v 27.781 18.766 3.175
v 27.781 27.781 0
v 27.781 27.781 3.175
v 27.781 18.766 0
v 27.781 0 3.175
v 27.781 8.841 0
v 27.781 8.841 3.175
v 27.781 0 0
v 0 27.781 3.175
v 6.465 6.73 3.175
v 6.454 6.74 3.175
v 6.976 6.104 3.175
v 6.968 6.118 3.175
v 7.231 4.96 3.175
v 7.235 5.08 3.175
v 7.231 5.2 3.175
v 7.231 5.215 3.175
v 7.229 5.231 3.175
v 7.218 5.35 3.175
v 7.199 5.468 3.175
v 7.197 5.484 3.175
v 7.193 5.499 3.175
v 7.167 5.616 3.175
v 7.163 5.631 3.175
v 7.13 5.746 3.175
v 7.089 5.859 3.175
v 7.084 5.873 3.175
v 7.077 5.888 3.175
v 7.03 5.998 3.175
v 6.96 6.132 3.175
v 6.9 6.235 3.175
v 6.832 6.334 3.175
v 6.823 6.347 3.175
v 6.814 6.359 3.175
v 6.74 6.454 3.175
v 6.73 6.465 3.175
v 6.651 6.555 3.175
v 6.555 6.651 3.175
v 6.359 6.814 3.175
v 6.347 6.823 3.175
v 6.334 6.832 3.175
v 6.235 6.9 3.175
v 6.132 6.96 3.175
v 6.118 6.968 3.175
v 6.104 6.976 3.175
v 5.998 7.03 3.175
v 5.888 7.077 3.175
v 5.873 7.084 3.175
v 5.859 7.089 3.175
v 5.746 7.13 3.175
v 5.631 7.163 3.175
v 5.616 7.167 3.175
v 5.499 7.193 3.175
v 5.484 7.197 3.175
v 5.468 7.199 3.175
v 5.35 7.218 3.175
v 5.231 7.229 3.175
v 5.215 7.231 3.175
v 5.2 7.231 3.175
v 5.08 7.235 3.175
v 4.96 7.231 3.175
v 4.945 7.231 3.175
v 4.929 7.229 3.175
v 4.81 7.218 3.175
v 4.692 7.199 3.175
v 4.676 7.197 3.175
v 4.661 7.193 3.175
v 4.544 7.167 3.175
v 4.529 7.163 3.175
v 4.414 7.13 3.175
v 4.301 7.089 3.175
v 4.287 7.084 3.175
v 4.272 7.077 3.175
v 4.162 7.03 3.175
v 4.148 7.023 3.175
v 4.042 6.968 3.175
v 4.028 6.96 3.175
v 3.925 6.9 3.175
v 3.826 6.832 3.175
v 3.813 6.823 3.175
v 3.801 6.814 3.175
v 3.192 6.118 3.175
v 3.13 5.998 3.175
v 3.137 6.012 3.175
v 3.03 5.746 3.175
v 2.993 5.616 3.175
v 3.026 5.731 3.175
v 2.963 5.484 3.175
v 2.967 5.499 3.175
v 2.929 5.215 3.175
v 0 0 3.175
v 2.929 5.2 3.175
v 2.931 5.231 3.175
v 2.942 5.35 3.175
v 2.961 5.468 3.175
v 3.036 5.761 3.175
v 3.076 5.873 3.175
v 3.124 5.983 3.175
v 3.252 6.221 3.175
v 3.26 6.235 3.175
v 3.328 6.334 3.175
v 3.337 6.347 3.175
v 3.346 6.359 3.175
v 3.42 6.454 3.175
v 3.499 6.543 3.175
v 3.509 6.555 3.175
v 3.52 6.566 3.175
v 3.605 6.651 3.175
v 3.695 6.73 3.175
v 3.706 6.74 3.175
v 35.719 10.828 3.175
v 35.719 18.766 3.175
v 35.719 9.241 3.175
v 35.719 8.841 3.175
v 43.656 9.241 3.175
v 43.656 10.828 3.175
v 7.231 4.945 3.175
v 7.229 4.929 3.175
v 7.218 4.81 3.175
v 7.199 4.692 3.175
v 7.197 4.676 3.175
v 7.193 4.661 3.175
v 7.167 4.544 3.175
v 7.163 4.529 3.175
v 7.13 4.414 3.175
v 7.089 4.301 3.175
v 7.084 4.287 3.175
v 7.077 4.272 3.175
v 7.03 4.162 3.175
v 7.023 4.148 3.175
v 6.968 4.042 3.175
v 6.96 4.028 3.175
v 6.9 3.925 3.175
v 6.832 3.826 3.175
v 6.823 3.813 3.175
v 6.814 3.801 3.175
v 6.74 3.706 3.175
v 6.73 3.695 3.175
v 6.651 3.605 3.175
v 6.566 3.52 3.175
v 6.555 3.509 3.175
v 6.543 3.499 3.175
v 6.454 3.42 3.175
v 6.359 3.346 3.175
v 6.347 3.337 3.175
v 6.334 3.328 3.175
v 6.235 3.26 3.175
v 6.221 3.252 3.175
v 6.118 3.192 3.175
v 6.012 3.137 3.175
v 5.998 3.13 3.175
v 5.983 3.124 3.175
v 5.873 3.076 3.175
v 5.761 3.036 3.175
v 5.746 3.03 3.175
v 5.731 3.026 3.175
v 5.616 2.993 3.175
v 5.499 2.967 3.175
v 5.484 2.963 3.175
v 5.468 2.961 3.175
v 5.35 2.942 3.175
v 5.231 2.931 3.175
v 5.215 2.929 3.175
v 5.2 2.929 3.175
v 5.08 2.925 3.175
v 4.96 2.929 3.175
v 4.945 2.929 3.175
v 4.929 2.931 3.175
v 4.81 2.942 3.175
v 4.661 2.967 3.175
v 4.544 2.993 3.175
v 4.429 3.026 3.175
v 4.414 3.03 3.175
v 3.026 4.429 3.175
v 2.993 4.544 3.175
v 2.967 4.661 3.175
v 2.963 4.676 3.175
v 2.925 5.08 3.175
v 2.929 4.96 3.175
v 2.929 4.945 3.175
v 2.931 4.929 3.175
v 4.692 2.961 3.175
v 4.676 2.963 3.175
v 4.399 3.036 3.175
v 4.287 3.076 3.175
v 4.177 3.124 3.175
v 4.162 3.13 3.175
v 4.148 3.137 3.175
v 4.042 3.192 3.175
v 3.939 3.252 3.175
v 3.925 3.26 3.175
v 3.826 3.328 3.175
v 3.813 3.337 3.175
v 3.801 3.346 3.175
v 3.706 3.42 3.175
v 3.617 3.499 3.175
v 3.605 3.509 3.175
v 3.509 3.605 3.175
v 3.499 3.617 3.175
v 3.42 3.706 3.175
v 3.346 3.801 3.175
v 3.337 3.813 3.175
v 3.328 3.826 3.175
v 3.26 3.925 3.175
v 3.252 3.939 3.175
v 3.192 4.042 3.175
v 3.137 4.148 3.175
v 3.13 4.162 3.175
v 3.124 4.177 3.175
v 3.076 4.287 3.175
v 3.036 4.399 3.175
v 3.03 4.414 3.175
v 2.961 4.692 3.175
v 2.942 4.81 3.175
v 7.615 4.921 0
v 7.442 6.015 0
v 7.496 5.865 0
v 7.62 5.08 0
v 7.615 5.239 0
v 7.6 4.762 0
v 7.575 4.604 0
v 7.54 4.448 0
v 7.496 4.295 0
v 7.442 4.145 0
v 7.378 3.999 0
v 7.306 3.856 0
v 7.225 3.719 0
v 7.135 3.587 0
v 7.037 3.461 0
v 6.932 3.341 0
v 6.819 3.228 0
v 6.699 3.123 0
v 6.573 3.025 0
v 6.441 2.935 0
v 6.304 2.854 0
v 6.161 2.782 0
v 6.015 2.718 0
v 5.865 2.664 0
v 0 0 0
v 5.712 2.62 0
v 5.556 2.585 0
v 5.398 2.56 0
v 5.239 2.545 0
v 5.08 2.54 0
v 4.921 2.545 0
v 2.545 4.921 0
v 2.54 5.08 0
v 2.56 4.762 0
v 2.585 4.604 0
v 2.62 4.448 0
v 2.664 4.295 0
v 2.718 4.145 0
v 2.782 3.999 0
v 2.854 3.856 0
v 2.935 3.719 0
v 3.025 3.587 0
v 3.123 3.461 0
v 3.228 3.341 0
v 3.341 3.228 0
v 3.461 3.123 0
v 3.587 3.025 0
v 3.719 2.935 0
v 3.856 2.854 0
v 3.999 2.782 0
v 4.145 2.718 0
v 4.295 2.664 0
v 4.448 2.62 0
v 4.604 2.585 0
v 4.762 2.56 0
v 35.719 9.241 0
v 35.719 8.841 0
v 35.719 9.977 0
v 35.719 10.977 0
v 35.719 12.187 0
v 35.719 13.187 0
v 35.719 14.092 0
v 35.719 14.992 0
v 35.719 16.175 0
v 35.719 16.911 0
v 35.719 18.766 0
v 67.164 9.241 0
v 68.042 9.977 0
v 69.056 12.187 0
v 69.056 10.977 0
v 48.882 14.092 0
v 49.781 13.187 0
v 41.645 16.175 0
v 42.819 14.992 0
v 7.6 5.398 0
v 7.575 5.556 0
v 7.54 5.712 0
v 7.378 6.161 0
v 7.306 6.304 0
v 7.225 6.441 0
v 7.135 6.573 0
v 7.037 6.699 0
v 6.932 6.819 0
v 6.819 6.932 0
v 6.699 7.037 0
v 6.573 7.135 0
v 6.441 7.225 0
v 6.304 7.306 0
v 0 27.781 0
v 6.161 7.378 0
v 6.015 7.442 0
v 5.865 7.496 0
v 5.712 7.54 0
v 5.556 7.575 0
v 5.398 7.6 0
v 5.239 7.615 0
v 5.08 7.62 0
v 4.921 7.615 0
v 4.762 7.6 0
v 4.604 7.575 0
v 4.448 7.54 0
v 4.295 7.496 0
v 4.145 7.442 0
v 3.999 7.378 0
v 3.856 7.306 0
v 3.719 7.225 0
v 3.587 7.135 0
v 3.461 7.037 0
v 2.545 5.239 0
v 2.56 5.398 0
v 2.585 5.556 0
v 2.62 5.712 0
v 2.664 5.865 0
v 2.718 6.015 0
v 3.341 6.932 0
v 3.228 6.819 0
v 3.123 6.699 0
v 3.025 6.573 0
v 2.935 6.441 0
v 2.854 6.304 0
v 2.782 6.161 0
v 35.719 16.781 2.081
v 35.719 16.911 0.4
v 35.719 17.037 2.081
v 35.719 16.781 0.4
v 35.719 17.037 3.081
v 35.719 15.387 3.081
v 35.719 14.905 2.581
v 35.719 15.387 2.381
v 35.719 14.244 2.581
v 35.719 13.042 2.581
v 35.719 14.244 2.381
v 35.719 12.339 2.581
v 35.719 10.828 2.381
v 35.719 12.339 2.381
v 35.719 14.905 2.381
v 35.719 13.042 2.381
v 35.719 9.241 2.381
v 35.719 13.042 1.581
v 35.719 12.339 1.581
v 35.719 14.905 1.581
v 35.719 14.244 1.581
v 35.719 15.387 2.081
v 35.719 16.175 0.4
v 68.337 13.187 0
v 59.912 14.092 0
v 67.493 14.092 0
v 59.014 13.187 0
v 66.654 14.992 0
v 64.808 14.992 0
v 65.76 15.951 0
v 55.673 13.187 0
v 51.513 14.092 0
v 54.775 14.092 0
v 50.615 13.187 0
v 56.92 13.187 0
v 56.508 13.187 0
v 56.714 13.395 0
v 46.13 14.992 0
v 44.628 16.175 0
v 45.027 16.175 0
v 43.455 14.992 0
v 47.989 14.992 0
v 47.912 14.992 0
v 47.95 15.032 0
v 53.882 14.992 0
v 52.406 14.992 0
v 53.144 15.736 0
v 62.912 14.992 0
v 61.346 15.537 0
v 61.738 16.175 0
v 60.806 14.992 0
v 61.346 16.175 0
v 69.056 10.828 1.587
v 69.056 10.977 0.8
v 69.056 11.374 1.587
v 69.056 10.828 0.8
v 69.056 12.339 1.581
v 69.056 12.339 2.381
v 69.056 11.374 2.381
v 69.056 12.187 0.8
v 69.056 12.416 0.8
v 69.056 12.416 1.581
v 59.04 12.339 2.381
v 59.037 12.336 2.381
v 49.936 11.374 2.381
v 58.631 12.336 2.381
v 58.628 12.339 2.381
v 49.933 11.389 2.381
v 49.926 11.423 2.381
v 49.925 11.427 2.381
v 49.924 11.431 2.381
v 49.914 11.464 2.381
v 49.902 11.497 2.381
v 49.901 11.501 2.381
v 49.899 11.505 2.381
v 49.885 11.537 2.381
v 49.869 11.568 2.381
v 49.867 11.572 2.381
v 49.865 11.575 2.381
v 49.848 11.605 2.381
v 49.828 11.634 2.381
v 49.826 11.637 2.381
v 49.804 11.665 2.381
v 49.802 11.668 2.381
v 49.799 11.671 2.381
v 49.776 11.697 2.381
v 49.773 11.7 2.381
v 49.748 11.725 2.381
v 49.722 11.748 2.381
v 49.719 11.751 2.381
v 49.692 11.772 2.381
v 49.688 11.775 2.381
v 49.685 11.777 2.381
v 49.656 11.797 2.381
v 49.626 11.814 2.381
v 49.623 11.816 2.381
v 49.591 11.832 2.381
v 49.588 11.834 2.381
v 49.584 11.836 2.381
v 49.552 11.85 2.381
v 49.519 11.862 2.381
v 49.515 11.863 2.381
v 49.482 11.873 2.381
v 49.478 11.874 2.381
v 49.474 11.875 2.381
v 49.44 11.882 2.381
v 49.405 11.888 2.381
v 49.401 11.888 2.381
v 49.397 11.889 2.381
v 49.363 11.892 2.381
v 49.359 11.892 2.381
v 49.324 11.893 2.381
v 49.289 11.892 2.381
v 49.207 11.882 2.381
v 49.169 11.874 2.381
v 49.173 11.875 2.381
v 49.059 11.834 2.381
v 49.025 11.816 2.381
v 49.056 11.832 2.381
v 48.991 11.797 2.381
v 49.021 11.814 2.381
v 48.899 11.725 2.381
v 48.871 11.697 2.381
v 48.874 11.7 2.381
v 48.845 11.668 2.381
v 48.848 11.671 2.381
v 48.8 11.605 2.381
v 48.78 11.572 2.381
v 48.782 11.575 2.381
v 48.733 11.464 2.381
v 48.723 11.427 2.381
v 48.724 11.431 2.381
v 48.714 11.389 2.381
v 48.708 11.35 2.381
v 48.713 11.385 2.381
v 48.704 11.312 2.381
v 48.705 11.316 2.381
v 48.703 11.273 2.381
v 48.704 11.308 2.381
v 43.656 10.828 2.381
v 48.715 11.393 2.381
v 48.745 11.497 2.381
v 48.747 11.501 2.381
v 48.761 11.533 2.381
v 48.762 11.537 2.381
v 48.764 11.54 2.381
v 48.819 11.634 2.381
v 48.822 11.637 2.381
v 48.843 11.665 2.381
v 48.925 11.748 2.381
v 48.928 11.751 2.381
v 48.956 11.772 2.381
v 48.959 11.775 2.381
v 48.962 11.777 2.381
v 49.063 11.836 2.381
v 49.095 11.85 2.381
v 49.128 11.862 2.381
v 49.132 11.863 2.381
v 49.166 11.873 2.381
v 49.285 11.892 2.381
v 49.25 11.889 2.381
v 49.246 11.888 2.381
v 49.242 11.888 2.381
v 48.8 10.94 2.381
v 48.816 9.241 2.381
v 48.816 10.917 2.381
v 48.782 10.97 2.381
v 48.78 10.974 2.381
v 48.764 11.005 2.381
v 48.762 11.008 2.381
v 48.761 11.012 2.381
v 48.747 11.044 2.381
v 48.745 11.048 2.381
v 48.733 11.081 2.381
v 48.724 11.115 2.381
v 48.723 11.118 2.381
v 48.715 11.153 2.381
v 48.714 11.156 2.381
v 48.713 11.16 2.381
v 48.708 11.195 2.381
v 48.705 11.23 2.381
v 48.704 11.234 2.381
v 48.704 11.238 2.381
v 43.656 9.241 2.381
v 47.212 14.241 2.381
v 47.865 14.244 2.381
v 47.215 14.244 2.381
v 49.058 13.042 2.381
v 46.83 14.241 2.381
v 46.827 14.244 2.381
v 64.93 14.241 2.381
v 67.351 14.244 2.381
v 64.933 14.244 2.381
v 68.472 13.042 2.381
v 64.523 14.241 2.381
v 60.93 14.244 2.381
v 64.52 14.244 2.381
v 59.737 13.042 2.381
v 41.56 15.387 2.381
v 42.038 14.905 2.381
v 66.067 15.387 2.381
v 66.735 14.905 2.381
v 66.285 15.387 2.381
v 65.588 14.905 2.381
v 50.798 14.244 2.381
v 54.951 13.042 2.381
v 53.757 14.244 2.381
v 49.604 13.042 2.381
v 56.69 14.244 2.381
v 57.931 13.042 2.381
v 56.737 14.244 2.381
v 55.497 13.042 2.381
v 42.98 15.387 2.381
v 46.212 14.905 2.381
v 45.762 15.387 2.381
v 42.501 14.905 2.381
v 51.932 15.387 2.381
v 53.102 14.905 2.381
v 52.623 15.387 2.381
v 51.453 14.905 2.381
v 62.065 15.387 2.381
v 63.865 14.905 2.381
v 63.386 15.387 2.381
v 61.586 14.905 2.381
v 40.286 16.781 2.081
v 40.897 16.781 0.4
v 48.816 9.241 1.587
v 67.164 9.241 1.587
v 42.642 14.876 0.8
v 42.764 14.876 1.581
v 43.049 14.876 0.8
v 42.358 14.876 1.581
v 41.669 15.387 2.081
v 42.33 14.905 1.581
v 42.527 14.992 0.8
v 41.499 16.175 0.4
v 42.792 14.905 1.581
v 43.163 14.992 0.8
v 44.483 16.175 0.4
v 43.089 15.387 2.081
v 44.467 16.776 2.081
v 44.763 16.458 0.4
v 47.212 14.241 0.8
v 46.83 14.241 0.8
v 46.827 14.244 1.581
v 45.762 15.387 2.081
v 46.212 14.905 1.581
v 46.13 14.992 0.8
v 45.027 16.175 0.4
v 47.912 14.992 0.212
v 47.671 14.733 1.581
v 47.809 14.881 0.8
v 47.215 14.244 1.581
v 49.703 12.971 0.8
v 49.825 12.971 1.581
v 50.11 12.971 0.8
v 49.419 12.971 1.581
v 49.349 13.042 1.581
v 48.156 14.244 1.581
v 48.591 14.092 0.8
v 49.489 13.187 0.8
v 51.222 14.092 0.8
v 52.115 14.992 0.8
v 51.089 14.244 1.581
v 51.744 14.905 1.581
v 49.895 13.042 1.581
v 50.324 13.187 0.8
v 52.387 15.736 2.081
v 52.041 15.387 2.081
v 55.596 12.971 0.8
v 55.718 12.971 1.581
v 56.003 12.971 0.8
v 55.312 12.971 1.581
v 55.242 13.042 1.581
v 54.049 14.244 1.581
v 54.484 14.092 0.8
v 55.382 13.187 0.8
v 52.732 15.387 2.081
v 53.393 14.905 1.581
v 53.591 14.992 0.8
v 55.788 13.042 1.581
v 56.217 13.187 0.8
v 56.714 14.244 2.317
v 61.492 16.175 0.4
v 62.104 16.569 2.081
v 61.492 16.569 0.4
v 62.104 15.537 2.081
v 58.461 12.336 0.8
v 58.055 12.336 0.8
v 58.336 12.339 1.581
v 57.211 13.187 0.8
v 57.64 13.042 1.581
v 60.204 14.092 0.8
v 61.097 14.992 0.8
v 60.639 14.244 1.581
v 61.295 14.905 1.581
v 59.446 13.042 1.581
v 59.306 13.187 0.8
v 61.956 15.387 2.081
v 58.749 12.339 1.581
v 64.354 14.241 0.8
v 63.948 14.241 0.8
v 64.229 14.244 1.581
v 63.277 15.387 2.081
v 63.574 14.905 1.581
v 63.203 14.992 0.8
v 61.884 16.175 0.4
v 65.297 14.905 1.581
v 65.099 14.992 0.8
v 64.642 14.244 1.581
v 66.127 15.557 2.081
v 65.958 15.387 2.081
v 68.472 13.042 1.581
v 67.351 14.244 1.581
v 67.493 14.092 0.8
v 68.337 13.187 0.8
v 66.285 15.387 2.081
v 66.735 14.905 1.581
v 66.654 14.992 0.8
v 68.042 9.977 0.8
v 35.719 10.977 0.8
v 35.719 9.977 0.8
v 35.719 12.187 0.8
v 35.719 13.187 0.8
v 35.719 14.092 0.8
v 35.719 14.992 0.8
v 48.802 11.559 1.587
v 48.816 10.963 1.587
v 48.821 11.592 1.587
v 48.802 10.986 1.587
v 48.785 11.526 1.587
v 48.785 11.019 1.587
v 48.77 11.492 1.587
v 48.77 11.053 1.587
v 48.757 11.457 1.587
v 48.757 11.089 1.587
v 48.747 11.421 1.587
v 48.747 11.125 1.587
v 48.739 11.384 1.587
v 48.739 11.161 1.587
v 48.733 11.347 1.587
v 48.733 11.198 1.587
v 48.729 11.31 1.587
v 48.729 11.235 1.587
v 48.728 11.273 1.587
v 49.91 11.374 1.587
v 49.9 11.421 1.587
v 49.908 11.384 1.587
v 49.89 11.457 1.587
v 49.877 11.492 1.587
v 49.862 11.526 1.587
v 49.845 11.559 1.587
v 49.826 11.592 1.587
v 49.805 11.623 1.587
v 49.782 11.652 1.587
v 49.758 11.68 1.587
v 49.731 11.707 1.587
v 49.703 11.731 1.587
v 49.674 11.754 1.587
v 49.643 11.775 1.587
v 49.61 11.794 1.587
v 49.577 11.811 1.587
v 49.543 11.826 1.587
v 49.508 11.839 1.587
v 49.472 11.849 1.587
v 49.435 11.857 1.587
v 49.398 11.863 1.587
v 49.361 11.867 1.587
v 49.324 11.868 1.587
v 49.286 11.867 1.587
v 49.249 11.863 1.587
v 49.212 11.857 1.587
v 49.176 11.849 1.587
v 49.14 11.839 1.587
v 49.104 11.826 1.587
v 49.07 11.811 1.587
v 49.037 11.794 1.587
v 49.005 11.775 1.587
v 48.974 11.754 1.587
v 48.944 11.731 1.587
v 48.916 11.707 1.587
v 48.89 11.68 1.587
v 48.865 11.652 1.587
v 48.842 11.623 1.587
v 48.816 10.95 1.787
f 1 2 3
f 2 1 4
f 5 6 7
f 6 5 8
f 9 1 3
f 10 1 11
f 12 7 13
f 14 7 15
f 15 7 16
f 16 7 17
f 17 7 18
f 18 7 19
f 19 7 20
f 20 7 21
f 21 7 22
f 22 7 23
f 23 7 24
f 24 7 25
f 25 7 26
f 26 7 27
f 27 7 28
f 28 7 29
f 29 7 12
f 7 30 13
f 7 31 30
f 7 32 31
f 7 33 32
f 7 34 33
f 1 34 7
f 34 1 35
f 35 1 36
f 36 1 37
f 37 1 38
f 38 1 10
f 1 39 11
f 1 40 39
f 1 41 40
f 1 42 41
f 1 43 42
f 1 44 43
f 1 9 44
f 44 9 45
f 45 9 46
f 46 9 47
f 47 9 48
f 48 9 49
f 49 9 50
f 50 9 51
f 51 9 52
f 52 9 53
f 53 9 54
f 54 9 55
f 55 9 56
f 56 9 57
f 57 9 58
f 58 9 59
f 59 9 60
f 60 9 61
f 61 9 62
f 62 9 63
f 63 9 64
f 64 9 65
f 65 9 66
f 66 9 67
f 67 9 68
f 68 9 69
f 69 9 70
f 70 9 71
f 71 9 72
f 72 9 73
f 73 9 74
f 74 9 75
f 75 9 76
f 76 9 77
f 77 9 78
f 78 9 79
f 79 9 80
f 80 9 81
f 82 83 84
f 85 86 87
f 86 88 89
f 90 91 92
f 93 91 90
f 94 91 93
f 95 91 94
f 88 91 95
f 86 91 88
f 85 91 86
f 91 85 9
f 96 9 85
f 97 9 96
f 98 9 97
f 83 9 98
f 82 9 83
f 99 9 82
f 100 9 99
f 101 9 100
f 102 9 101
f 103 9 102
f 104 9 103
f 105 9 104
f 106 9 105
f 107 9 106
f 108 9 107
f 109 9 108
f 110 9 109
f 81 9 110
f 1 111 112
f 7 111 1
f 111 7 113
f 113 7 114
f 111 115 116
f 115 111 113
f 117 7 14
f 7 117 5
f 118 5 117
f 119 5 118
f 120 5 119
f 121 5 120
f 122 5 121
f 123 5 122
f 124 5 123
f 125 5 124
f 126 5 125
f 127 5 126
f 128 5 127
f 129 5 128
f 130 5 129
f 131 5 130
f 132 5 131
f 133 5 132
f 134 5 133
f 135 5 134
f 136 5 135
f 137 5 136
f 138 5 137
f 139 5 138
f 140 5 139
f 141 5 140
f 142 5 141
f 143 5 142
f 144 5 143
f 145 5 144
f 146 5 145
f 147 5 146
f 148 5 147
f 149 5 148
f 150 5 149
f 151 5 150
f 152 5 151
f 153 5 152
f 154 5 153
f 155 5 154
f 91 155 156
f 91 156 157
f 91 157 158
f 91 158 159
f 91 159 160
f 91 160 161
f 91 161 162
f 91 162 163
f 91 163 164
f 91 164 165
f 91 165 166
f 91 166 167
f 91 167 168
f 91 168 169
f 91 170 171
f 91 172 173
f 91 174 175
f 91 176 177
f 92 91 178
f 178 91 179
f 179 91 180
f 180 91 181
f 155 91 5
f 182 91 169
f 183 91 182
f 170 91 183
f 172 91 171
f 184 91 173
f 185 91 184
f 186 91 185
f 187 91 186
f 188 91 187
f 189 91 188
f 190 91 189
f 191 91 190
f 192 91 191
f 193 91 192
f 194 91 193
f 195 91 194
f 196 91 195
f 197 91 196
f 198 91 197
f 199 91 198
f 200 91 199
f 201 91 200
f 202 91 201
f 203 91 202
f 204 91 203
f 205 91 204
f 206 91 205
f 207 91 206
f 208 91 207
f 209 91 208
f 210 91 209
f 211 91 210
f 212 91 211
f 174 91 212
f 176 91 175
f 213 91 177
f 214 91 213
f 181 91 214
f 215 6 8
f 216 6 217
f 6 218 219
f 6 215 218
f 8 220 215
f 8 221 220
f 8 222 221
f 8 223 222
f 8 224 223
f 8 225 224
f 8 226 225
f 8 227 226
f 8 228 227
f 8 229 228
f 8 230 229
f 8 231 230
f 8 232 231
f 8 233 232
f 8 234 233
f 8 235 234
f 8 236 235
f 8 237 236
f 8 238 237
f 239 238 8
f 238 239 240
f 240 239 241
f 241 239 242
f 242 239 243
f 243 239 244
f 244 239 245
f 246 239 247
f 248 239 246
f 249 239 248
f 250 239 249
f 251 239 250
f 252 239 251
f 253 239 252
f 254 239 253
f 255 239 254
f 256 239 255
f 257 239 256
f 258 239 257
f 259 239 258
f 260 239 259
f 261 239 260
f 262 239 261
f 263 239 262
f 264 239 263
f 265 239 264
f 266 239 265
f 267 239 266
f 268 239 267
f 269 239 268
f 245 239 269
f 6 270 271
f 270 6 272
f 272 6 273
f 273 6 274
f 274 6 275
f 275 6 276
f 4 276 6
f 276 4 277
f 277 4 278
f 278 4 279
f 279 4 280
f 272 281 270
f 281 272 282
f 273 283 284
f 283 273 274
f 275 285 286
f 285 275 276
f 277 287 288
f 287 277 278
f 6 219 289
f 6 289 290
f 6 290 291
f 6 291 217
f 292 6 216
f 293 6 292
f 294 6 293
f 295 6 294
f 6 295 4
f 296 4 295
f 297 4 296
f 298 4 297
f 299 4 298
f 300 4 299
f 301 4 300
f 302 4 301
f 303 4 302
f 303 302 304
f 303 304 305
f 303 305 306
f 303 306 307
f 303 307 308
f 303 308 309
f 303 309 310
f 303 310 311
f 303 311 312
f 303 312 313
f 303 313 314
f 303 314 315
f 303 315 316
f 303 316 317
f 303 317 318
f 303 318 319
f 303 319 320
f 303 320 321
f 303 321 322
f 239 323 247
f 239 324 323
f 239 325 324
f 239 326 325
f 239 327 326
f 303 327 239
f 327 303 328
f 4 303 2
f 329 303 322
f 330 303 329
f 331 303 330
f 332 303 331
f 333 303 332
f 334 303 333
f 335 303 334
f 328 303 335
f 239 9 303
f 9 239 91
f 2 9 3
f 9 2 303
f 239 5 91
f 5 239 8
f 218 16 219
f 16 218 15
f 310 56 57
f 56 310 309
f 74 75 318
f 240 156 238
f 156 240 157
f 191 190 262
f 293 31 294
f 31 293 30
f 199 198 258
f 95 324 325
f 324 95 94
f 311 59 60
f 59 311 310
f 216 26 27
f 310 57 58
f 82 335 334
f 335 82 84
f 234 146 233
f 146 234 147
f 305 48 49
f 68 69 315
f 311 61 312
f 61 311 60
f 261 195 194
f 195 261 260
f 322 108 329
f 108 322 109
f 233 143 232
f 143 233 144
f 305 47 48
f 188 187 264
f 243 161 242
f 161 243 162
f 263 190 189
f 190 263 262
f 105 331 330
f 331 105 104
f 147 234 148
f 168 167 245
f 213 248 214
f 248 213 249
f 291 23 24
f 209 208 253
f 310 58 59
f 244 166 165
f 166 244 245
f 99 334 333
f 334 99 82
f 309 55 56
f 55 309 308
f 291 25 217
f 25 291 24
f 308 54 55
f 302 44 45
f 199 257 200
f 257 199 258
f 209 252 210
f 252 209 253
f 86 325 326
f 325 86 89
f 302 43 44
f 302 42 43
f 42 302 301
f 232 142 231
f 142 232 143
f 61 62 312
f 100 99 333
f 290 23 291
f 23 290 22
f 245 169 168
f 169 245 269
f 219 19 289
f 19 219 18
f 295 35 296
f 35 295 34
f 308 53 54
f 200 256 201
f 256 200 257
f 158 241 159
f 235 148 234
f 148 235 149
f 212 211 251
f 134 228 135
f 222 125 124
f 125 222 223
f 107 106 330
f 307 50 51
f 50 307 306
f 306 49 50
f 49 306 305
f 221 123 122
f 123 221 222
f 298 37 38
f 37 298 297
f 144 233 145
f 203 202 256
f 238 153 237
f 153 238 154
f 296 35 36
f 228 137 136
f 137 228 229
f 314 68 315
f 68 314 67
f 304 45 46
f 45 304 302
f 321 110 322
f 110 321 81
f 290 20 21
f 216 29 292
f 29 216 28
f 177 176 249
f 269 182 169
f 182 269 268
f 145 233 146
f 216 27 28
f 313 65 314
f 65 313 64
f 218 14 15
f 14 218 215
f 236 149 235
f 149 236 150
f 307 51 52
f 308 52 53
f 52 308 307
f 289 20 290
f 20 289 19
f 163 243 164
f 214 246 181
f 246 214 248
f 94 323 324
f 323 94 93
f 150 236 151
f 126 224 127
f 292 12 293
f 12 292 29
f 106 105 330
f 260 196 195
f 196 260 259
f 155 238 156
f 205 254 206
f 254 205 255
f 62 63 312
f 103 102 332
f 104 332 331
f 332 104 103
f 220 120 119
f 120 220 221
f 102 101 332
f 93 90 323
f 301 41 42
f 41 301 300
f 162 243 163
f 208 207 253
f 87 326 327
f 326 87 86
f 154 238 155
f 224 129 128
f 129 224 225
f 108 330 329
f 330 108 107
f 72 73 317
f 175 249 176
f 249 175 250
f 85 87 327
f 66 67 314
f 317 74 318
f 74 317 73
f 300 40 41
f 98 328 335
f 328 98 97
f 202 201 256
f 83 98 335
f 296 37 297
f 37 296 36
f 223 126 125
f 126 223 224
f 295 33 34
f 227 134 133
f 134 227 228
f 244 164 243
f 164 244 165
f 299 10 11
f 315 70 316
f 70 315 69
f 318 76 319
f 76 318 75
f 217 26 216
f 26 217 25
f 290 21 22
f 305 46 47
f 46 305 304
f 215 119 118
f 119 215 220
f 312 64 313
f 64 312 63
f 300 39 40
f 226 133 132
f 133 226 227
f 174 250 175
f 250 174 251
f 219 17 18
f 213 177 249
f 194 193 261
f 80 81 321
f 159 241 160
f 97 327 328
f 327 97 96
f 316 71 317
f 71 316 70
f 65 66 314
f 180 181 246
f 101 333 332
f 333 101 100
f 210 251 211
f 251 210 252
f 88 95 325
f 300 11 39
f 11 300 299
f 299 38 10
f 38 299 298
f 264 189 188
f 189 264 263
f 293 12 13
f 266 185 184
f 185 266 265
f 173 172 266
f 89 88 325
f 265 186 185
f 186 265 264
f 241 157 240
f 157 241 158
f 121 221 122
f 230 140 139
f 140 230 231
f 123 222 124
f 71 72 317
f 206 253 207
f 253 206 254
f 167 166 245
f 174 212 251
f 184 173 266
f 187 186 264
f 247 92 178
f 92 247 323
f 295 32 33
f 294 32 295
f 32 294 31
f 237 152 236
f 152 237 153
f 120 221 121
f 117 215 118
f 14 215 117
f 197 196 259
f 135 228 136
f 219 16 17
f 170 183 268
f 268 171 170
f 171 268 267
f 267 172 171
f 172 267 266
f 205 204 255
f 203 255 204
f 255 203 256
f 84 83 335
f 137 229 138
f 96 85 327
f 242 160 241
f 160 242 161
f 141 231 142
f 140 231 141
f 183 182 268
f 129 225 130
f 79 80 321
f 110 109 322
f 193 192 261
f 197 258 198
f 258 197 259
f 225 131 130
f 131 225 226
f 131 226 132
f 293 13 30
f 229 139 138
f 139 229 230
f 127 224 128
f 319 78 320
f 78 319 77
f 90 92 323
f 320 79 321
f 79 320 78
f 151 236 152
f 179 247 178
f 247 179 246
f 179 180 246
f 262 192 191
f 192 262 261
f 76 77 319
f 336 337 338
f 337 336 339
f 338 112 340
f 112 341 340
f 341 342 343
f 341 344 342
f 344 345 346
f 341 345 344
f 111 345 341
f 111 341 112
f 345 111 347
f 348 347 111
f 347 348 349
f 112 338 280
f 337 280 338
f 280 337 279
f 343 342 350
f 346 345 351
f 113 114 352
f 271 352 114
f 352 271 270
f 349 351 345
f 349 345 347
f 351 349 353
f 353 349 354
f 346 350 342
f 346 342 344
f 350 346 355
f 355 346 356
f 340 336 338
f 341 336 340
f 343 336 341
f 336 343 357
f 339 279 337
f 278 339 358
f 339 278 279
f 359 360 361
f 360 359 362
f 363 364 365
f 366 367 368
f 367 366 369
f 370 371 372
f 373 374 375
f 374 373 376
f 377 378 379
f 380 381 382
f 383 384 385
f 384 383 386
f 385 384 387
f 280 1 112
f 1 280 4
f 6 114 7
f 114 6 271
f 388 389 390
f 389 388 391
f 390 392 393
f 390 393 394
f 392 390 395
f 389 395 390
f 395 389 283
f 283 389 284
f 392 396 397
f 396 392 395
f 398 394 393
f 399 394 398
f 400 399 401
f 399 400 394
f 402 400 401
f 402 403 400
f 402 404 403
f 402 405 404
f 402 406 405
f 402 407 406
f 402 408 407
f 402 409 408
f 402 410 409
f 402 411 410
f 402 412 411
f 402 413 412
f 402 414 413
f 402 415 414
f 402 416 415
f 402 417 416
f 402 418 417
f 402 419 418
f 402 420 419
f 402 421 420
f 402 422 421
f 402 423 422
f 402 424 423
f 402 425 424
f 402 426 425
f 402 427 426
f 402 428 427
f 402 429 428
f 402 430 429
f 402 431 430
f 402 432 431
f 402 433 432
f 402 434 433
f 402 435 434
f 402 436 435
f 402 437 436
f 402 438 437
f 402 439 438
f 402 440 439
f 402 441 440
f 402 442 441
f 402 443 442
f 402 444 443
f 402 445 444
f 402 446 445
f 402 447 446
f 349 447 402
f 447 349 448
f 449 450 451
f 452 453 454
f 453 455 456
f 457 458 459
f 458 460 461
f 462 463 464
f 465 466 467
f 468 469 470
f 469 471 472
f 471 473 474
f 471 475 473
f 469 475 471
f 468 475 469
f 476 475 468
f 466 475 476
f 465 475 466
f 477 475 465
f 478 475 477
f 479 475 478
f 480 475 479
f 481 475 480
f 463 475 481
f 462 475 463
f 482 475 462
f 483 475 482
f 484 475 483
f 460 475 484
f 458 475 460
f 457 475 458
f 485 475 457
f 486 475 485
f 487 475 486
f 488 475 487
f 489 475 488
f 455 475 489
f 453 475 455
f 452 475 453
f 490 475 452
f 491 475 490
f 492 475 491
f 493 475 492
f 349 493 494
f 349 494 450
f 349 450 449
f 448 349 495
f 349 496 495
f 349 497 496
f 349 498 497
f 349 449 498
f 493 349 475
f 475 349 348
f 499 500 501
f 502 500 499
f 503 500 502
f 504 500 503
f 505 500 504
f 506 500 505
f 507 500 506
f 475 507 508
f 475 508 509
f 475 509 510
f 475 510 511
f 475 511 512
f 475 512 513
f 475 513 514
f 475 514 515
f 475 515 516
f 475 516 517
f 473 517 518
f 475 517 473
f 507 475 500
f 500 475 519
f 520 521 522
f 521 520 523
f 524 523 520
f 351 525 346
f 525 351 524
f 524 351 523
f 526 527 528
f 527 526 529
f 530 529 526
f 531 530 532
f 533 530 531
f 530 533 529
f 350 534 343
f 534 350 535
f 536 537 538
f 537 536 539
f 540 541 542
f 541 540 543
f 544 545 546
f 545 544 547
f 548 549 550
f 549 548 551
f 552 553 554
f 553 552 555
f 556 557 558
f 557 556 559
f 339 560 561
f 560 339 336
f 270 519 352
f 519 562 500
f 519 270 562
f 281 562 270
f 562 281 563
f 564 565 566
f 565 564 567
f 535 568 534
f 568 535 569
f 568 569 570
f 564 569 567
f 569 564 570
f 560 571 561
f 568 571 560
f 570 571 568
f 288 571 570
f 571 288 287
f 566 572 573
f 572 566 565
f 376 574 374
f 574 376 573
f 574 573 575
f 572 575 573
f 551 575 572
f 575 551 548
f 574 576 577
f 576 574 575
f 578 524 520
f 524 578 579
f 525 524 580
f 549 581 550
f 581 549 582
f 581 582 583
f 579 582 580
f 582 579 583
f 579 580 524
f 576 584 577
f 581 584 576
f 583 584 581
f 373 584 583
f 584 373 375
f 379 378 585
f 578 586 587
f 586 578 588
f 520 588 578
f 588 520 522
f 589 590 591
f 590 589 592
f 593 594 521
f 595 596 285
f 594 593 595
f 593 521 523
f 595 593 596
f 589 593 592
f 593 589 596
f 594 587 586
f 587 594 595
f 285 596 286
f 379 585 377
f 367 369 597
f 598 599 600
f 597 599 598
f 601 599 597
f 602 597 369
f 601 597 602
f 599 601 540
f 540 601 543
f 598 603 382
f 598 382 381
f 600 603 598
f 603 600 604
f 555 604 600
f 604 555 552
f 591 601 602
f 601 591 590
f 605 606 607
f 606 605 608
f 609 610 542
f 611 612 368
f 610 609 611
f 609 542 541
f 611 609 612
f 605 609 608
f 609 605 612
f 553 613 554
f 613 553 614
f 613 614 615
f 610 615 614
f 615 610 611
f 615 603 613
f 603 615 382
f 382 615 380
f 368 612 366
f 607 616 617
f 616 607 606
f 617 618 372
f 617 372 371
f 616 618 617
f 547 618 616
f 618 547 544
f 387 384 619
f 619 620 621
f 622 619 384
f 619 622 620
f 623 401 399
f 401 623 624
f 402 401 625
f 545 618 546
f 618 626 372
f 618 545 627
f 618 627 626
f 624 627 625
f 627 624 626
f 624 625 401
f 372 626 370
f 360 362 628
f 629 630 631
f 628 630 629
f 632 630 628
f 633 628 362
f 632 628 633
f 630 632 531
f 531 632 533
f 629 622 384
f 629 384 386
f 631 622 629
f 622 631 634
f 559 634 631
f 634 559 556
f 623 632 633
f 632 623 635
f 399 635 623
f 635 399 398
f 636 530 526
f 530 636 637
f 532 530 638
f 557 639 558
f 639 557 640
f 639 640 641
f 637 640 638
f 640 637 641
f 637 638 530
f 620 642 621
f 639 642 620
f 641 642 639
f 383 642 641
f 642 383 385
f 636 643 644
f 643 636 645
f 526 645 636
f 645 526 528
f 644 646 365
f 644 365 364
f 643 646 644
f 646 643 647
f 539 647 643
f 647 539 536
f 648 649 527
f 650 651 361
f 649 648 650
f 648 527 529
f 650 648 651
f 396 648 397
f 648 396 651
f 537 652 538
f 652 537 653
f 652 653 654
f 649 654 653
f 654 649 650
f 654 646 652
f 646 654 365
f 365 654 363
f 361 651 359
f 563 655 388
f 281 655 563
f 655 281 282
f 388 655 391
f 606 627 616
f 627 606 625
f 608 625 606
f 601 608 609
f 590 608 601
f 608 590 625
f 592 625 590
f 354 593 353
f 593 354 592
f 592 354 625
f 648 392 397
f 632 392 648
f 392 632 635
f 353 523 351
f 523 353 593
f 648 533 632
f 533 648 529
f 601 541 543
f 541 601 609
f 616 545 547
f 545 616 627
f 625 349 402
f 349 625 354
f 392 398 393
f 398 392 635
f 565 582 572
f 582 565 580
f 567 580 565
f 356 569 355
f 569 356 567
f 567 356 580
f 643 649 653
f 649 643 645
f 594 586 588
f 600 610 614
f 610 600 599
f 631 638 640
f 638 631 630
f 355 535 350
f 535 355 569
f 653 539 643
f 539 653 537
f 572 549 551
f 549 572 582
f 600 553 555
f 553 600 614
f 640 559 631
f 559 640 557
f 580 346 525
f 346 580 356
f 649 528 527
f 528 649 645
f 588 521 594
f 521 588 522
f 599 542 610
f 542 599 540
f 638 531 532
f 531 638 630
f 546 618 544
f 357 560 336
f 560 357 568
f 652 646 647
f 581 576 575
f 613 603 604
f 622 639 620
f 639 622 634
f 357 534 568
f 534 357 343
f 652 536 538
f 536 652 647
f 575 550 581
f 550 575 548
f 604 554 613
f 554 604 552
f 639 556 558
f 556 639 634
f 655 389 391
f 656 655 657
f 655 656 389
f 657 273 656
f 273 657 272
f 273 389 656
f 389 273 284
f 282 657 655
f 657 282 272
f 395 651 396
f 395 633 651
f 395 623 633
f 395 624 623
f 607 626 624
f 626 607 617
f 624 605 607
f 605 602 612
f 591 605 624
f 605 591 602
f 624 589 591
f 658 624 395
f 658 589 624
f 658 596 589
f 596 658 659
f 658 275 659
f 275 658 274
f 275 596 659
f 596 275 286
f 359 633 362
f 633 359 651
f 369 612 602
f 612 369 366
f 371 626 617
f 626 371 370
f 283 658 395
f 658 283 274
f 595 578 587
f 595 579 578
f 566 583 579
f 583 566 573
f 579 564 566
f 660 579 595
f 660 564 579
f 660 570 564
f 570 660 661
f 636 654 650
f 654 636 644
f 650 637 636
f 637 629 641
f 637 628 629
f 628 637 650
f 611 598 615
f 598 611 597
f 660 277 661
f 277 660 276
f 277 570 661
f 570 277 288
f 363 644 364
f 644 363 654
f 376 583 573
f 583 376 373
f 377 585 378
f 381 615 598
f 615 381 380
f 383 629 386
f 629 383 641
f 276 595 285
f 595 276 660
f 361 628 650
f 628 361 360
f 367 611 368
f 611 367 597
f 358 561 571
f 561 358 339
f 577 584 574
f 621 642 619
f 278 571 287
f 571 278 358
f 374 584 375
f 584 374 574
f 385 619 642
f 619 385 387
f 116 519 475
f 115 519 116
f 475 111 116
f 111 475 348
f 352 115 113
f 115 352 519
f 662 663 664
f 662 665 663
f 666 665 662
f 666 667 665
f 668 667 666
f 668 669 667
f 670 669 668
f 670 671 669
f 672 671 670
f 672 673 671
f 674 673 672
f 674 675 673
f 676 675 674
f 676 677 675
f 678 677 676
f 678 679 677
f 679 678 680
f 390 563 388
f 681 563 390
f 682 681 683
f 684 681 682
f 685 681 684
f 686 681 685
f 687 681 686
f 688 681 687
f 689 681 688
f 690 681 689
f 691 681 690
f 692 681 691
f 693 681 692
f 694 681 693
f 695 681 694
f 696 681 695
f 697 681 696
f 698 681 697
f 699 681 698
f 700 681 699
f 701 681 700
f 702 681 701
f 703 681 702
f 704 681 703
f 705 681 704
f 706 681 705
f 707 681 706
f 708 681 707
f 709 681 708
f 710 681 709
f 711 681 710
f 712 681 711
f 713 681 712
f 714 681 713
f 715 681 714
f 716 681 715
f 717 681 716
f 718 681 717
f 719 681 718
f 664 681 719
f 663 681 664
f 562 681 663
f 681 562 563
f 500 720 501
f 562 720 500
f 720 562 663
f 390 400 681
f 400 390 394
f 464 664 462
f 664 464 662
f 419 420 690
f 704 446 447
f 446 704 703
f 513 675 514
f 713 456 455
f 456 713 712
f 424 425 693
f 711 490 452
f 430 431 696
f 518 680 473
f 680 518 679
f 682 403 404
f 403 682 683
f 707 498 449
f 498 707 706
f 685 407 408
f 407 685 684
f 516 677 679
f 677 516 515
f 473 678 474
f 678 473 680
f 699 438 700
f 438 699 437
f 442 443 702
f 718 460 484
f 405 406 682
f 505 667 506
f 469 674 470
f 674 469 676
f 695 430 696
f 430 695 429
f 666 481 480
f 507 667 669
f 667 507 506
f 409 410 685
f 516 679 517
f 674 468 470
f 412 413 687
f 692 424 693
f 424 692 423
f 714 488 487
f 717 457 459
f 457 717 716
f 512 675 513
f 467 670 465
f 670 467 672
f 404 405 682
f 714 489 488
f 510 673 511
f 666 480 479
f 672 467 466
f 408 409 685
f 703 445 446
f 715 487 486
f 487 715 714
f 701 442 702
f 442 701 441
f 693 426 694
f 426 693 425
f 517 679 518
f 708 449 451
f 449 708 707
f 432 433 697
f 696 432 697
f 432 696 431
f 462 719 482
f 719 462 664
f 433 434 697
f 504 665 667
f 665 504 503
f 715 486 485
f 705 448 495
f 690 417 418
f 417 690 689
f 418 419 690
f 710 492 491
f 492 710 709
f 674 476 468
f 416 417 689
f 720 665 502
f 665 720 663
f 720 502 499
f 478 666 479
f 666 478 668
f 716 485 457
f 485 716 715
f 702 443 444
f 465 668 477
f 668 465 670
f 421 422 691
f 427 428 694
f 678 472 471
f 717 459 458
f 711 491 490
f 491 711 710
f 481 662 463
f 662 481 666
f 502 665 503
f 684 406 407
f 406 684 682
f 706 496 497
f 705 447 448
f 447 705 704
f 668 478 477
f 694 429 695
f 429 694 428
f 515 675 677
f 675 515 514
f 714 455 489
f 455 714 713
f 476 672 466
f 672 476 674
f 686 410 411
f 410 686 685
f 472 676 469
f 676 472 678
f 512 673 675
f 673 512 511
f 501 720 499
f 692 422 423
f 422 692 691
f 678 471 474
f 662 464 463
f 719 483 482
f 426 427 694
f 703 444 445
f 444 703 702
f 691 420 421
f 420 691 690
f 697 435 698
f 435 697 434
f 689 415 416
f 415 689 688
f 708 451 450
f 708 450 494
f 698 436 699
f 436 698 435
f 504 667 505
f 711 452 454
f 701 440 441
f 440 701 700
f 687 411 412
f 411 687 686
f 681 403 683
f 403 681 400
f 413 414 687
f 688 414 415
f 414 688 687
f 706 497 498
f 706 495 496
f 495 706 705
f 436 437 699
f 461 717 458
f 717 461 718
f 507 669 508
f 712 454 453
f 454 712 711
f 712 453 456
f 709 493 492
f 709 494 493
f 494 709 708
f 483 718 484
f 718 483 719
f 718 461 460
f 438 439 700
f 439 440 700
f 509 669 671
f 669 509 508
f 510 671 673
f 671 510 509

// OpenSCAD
$fn=100;

// This converts inches to millimeters
function mm(i) = i*25.4;

// The handle of the key. Doesn't do much aside from help turn the key.
module bow(bow_length, bow_width, bow_thickness)
{
	// Creates the hole in the "box"
	difference() {
		// Creates the big "box"
		cube([bow_length, bow_width, bow_thickness]);
		// Cuts out the round hole in it
		translate([mm(0.2), mm(0.2), 0]) cylinder(mm(.5), mm(.1));
  }
}

// A single bit ( I think )
module bit()
{
	w = mm(.15);
	difference()
	{
		translate([-(mm(1/4))/2, 0, -(mm(1/4))/2]) cube([mm(1/4), mm(1), 2*w]);
		translate([-mm(4/512)+0.007, 0, -w]) rotate([0, 0, 133]) cube([w*2, w*2, 3*w]);
		translate([mm(4/512)-0.008, 0, -w]) rotate([0, 0, -43]) cube([w, w*2, 3*w]);
	}
}

// Calculates most things for the blade
module blade(blade_length, blade_width, blade_thickness, key_cuts, key_cut_angle, key_cut_spacing, shoulder, cut_spacing, cut_depth)
{
	// The first item in this is the starting block. All subsequent items get subtracted from the first one.
	difference()
	{
		// Makes the blade, basically a squared off rectangle at this point.
		// Also has the groove for the (slider?).
		union() {
			translate([0, -0.4, 0]) cube([shoulder, mm(3/8) +0.4 , mm(.125)]);
			cube([blade_length + shoulder, blade_width, blade_thickness]);
		}
		
		// This cuts out part of the blade's tip top part to make it slanted.
		translate([blade_length + shoulder, mm(1/8), 0]) { rotate([0, 0, 43]) cube([10, 10, blade_thickness]); }
		// This cuts out part of the blade's tip bottom part to make it slanted.
		translate([blade_length + shoulder, mm(1/16), 0]) { rotate([0, 0, 220]) cube([10, 10, blade_thickness]); }
		
		//Side mill
		// - The eagle side
		// These control how deep the grooves go.
		// "Tip: The end of the key opposite of the bow. Some locks use the tip of the key to align cuts instead of the shoulder." http://www.lockwiki.com/index.php/Key
		tip = 0.8;
		tip2 = 0.3;
		tip3 = 0.4;
		
		// (left side is relative from looking at the key from the perspective of the lock)
		// These three cut out grooves on the side of the key on the left side
		translate([shoulder, 3.0988 , blade_thickness - tip]) cube([blade_length + 0.2, 0.7022, 1]);
		translate([shoulder, 5.0038 , blade_thickness - tip]) cube([blade_length + 0.2, 0.6604, 1]);
		// This one is for the top part.
		translate([shoulder, 6.1468 , blade_thickness - tip2]) cube([blade_length + 0.2, 1.65, 1]);
		
		
		// - The Non-eagle side
		// (right side is relative from looking at the key from the perspective of the lock)
		// These ones are for right side of the key.
		translate([shoulder, 0.7366, tip - 1]) cube([blade_length + 0.2, 1 , 1]);
		translate([shoulder, 2.9464, tip - 1]) cube([blade_length + 0.2, 1 , 1]);
		translate([shoulder, 4.8514, tip - 1]) cube([blade_length + 0.2, 0.9, 1]);
		translate([shoulder, 6.9342, tip3 - 1]) cube([blade_length + 0.2, 0.7366, 1]);

		// Cuts the bits in the blade. Also does the biaxial rotation.
		for (counter = [0:5])
		{
			translate([ shoulder + mm(0.244) + cut_spacing*counter + key_cut_spacing[counter] * mm(0.031), blade_width - (key_cuts[counter]) * cut_depth + 0.000125, blade_thickness/2])
			rotate ([0, key_cut_angle[counter] * 20, 0])
			bit();
		}
	}
}


module biaxial(key_cuts, key_cut_angle, key_cut_spacing)
{   
	blade_length = mm(1.3125);
	blade_width = mm(0.296875);
	blade_thickness = mm(0.09375);

	// The shoulder is the part of the key that connects to the bow of the blade.
	shoulder = mm(0.3125);
	cut_spacing = mm(.17);
	cut_depth = mm(.025);

	bow_length = mm(1.09375);
	bow_width = mm(1.09375);
	bow_thickness = mm(.125);
	
	//from origin to the bottom of the blade
	blade_starting = 11;
	
	//first difference on eagle side
	dip = 2.1336;

	difference()
	{
		union()
		{
			// Draw the bow
			bow(bow_length, bow_width, bow_thickness);
			translate([bow_length, bow_width - blade_width - blade_starting, 0])
			
			// Draw the blade
			blade(blade_length, blade_width, blade_thickness, key_cuts, key_cut_angle, key_cut_spacing, shoulder, cut_spacing, cut_depth);
			translate([mm(1.09375 + 0.3125), bow_width - blade_width - blade_starting, mm(0.09375)]) cube([mm(0.3125), mm(0.0625), mm(0.03125)]);
		}

		translate([mm(1.921875), bow_width - blade_width - blade_starting - 0.5 ,mm(0.0625)]) cube([mm(0.796875) + 0.5, dip + 0.5, mm(0.3125) + 0.5]);
		translate([mm(1.921875) +mm(0.02) , bow_width - blade_width - 11 + mm(0.08)  , mm(0.0625)]) cylinder(mm(0.5), mm(0.0234375));
	}
}

// See this page to understand all of the lingo about fore / aft
// http://www.lockwiki.com/index.php/Medeco_Biaxial

//Angles:
//     -1 = -20
//      0 = 0
//      1 = 20


//Cut spacing:
//      aft = -1
//      center = 0
//      fore = 1


// Current pin
// These are ordered by cuts closest to the bow first.
//           Key Cuts          Key Cut Angle       Key Cut Spacing
biaxial([3, 4, 6, 6, 7, 4], [-1, 0, -1, -1, 1, 1], [1, 1, -1, 1, -1, 1]);



// The original function call that came with this scad model:
// biaxial([3, 2, 4, 3, 4, 3], [0, 1, 1, 1, 1, 0], [1, -1, -1, 1, -1, 1]);
